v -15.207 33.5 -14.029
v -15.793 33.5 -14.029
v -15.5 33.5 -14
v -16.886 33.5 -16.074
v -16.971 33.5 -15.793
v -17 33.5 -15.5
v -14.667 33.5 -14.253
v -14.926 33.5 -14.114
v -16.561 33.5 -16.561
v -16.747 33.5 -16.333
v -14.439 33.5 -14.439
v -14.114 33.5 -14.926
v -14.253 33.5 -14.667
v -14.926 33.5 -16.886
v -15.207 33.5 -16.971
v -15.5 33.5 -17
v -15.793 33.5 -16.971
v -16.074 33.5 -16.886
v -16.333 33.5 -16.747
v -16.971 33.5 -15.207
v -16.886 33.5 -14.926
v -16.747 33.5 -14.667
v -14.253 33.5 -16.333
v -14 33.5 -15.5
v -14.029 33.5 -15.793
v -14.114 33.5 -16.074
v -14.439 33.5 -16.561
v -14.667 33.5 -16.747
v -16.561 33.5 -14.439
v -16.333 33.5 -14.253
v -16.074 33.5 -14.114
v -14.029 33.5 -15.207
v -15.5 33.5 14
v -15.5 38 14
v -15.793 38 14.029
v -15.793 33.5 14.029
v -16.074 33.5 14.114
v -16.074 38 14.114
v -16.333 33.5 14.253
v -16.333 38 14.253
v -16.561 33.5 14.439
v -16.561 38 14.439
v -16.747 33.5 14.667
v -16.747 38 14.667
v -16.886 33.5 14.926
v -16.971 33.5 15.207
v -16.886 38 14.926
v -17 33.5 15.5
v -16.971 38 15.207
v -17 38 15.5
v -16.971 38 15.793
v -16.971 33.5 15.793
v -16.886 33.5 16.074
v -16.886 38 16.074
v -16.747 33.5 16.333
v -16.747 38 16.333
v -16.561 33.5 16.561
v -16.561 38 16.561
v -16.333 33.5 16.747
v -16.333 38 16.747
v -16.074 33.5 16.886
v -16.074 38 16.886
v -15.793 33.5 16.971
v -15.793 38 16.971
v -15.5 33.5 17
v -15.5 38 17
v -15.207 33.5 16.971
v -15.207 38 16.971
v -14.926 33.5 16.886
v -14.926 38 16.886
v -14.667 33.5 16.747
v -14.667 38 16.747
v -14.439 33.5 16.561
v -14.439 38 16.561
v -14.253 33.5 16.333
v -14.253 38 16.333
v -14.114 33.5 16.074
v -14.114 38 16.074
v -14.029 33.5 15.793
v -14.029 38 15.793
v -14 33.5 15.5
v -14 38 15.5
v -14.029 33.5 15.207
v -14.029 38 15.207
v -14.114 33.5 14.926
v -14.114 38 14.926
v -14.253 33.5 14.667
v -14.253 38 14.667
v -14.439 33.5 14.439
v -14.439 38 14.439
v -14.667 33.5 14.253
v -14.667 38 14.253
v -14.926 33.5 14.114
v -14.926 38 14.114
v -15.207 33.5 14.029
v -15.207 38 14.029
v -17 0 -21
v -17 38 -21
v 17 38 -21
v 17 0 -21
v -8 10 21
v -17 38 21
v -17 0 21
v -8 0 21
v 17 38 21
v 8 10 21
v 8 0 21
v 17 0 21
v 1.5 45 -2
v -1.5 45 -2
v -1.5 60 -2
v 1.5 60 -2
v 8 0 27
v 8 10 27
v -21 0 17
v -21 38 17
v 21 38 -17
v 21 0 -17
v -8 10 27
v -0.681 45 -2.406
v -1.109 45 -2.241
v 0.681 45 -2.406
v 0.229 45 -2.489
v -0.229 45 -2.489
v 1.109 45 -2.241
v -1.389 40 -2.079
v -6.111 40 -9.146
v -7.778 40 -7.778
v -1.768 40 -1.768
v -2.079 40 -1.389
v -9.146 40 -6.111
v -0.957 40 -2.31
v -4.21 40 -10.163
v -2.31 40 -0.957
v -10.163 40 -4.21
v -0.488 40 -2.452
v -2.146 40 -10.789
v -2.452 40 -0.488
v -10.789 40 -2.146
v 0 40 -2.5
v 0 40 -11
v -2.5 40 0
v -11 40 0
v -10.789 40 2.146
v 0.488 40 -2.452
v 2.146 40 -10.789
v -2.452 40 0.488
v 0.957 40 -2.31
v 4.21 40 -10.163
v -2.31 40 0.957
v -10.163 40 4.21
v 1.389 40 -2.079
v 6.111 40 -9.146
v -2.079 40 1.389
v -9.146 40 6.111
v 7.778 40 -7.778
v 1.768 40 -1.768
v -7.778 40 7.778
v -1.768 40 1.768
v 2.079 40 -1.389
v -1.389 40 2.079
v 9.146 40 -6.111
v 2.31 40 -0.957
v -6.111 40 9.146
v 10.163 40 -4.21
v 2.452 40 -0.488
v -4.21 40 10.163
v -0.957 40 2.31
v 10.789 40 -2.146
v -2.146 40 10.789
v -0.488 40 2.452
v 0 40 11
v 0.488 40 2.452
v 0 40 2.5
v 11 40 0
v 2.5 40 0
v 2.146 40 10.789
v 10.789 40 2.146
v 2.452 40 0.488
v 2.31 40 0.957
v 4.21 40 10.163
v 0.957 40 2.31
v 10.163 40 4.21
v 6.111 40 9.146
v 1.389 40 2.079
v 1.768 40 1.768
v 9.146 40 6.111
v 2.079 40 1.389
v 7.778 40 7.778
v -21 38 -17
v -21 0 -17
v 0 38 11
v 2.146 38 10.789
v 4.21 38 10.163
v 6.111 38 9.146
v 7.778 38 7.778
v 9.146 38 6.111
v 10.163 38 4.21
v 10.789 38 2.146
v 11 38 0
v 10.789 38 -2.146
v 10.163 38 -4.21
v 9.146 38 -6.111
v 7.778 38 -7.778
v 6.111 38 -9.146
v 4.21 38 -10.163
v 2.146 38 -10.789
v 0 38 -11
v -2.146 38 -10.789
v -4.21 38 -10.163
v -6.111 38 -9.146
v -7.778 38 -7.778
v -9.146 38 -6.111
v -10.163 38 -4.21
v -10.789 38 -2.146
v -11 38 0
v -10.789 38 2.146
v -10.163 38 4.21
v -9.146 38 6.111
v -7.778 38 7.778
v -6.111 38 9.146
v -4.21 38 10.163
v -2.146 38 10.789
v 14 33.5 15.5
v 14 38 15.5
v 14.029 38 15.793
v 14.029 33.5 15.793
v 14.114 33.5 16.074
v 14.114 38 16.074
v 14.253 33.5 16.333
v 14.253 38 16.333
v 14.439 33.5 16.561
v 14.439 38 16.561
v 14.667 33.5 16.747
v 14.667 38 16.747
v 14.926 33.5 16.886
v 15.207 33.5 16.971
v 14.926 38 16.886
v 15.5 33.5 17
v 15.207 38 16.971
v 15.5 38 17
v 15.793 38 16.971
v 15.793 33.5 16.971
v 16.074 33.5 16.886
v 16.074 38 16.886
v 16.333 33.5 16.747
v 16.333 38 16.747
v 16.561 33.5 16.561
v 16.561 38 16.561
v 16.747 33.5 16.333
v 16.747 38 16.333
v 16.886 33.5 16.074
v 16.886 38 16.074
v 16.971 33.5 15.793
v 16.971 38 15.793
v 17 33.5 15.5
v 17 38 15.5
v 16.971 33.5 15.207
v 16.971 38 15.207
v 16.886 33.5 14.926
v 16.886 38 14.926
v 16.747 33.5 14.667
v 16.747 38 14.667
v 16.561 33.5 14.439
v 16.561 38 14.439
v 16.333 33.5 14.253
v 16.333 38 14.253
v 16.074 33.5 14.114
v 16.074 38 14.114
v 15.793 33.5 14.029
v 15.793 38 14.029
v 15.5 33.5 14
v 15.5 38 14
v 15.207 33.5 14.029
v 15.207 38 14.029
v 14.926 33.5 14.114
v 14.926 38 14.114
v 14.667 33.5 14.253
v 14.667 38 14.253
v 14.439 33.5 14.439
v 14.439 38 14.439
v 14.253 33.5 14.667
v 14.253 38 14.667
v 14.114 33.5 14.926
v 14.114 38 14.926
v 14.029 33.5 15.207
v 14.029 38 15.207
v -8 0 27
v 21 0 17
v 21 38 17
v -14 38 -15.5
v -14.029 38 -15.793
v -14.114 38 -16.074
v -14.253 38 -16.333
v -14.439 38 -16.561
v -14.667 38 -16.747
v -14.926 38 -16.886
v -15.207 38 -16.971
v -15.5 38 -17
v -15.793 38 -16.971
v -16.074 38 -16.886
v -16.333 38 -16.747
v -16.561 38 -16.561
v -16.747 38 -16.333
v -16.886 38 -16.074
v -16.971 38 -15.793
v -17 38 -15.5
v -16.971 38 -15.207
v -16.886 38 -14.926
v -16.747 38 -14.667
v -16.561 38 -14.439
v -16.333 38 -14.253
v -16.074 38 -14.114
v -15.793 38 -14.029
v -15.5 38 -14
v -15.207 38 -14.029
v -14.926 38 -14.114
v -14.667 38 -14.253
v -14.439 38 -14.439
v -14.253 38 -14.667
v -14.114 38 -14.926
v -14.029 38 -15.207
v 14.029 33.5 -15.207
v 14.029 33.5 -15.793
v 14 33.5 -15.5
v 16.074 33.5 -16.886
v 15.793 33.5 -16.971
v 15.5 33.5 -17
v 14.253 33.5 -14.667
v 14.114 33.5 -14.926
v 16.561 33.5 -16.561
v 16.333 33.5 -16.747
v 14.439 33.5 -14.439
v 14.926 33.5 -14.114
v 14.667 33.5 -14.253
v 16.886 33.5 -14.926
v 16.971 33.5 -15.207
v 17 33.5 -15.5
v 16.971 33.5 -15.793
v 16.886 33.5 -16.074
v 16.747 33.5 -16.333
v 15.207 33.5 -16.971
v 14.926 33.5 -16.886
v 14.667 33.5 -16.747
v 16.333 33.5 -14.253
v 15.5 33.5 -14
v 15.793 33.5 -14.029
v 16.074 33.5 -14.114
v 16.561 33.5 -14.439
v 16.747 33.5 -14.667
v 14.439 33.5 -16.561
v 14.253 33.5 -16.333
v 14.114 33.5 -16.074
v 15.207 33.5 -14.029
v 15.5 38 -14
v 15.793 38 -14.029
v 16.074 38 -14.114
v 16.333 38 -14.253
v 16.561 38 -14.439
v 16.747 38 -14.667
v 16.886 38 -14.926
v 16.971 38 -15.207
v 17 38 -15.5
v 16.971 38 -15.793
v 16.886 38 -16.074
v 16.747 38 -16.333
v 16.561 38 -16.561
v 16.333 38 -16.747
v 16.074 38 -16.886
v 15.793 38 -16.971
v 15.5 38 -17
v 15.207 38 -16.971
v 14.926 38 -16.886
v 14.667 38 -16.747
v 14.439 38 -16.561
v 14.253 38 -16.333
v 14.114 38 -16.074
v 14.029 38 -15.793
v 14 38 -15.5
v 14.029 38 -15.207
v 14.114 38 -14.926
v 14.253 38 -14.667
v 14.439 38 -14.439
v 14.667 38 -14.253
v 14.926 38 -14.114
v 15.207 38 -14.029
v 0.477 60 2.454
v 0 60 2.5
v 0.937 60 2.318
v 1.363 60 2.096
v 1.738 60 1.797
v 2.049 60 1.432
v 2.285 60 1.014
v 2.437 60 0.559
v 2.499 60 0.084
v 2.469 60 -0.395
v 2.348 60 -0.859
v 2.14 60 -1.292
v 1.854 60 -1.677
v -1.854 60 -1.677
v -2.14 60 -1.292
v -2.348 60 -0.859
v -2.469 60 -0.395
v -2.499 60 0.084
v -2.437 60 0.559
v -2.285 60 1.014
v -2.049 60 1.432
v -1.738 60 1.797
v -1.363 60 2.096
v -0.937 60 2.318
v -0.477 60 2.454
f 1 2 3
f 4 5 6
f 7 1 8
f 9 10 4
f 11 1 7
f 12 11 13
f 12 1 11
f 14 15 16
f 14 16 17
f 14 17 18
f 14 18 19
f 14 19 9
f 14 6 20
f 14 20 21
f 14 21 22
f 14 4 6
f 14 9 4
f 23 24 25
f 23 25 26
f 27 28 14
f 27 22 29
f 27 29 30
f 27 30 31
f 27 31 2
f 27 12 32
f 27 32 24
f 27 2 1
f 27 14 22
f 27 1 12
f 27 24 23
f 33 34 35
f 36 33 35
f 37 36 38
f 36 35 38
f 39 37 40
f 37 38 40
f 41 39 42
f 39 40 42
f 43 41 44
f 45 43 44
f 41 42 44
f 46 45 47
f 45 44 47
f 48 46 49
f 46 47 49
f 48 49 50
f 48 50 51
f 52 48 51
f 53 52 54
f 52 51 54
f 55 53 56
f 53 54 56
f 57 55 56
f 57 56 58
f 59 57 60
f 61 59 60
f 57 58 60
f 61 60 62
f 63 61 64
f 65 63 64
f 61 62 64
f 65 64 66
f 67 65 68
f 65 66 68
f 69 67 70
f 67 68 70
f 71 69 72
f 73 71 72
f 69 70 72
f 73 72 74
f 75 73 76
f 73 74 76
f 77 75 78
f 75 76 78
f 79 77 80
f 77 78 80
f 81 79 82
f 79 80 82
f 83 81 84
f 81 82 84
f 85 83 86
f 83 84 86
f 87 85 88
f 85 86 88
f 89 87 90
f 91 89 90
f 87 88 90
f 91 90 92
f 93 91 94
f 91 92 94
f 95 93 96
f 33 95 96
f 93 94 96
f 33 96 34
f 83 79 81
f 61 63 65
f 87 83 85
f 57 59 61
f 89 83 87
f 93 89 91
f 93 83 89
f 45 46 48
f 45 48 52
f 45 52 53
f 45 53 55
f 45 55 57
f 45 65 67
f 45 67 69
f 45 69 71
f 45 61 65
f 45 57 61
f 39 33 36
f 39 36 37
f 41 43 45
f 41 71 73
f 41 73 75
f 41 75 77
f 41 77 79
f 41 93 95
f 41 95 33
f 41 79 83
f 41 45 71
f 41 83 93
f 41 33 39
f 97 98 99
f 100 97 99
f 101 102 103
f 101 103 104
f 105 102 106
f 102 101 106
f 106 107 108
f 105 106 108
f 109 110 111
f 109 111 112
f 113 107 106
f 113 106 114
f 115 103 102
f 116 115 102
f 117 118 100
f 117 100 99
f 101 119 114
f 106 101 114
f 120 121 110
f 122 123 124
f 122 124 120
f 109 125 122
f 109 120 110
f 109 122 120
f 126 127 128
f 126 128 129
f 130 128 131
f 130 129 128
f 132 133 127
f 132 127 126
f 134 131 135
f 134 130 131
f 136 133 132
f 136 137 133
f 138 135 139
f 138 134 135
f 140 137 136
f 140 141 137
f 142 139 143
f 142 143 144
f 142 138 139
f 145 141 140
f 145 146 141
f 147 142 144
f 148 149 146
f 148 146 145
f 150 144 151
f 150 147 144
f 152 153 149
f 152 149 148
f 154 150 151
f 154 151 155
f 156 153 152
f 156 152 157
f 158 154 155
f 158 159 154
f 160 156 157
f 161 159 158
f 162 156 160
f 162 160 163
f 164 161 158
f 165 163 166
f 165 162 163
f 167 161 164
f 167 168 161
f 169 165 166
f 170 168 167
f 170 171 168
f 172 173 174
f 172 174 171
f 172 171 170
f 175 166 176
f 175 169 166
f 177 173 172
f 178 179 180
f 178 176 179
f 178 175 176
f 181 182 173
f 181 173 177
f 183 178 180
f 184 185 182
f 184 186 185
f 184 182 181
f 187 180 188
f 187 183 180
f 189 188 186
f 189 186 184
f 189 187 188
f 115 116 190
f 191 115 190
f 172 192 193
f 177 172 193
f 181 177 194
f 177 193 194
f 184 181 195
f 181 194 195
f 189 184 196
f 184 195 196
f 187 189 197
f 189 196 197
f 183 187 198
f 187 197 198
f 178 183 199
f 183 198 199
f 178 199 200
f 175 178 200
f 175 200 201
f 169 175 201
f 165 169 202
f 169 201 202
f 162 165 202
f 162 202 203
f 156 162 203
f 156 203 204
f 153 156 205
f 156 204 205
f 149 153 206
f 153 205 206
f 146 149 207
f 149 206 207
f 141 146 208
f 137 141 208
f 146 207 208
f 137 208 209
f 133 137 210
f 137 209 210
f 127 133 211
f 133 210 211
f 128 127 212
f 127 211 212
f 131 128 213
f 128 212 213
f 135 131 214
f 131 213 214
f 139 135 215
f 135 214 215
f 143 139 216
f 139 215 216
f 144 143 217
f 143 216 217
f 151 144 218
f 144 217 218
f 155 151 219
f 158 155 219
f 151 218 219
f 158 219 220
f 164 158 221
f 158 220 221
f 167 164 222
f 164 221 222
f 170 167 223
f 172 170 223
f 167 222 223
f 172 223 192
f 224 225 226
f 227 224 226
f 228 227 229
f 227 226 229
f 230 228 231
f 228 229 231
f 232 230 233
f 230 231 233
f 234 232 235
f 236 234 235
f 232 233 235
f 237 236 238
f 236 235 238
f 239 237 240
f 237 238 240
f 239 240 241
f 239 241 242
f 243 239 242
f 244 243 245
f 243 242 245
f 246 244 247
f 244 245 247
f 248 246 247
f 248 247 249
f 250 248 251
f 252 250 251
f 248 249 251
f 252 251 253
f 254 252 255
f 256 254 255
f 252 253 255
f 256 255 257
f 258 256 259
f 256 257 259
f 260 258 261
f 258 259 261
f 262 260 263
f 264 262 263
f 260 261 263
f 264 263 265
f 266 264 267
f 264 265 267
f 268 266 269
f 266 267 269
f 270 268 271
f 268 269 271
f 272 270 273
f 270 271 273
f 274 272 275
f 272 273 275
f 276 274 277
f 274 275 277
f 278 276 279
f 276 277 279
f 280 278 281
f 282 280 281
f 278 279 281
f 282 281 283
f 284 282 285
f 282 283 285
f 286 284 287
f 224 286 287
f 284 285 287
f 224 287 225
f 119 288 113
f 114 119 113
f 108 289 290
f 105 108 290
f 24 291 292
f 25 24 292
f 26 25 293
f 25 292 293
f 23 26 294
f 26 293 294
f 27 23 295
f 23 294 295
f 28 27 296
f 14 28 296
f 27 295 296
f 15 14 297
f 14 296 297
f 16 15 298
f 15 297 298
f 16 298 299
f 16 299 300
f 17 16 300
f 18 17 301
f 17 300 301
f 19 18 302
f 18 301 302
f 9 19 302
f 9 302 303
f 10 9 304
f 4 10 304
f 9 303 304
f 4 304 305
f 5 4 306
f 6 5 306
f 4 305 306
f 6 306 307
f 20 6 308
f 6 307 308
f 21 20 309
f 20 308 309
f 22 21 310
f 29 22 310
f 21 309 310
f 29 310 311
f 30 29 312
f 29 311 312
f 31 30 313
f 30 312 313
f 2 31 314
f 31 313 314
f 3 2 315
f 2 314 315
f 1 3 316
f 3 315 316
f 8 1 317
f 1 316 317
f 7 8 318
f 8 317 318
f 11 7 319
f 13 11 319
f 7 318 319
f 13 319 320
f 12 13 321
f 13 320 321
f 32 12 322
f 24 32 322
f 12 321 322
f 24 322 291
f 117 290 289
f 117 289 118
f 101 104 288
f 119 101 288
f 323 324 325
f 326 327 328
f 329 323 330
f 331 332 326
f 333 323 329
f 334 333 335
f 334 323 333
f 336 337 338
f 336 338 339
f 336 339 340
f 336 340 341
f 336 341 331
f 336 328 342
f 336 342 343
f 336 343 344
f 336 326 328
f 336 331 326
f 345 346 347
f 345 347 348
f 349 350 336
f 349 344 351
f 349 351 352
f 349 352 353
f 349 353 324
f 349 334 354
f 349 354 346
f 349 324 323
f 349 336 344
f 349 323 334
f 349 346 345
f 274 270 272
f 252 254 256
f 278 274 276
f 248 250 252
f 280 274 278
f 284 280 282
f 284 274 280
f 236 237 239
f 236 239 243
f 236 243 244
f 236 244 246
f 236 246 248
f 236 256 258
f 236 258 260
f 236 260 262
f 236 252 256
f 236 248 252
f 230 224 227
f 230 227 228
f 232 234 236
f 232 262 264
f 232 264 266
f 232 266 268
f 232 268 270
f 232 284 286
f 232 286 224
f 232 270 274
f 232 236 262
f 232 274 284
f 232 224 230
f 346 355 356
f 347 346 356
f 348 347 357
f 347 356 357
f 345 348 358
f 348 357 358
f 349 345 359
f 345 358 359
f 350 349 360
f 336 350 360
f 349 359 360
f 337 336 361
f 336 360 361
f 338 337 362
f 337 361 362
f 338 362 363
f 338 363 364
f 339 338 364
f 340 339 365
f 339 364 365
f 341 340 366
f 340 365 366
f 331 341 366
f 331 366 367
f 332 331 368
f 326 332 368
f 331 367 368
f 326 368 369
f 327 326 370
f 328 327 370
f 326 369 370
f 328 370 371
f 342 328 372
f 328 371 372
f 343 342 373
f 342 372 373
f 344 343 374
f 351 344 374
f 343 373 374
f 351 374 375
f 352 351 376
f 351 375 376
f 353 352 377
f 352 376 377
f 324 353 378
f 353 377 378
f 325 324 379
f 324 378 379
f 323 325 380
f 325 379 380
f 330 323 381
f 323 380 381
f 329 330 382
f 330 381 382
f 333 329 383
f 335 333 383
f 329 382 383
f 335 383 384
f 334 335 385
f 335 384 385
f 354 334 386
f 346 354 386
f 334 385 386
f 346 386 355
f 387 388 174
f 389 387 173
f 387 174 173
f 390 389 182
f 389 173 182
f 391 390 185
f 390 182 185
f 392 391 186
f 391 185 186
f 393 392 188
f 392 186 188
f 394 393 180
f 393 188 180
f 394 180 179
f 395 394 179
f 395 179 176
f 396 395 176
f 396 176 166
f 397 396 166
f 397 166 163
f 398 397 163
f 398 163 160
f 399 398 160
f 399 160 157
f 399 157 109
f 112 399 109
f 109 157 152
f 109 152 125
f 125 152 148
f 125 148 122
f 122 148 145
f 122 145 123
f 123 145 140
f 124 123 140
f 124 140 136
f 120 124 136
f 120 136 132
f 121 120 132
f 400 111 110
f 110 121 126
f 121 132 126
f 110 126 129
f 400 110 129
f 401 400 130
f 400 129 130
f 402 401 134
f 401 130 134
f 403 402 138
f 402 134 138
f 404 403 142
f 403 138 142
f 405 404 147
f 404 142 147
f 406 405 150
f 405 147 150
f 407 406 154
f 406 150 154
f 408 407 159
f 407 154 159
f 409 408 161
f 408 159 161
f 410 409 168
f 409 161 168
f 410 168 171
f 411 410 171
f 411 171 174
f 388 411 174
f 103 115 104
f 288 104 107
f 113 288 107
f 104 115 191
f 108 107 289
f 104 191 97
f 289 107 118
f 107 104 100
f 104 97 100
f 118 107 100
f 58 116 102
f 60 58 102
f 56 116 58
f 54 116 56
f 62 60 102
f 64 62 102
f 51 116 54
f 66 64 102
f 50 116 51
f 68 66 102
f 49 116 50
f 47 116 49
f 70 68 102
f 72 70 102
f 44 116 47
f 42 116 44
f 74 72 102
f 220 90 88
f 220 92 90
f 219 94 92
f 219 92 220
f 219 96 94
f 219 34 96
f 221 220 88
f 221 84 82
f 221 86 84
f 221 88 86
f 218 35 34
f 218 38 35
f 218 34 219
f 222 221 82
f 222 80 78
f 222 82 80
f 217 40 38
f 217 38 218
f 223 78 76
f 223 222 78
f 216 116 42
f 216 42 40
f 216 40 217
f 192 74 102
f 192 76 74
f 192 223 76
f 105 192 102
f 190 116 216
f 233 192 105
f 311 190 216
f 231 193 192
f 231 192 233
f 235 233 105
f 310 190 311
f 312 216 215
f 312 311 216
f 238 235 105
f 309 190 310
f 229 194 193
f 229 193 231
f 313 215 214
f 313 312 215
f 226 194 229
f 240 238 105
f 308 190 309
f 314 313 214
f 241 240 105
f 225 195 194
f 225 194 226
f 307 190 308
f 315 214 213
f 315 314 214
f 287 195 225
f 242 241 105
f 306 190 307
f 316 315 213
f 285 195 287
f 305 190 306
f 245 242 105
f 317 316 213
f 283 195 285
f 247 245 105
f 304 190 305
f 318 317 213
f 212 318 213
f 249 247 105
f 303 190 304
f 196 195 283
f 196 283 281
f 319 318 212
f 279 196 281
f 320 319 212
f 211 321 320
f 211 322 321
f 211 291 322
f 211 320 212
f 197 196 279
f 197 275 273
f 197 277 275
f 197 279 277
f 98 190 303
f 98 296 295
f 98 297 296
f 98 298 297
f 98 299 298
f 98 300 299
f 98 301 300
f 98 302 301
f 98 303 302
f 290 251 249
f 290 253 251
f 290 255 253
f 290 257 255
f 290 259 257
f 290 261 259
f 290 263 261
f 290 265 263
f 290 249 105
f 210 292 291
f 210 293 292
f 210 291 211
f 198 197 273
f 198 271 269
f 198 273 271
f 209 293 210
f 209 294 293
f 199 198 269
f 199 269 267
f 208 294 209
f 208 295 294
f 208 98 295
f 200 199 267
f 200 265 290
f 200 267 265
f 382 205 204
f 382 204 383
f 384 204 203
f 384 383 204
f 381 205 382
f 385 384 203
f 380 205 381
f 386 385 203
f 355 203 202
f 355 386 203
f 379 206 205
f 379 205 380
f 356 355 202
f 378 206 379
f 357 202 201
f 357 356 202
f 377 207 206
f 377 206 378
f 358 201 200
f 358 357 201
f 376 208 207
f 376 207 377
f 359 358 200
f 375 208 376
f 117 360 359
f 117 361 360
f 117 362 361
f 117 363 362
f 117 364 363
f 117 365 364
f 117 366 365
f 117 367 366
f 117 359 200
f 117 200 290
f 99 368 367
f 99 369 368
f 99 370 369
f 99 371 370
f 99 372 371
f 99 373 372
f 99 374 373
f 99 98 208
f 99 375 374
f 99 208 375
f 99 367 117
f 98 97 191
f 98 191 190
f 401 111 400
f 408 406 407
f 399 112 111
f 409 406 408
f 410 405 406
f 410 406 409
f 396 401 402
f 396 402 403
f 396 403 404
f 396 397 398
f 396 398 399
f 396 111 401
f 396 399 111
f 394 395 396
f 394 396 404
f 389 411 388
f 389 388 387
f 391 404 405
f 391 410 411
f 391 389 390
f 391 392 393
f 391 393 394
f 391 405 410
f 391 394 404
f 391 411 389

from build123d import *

# Parameters (mm, degrees)
SKETCH_1_W               = 42
SKETCH_1_H               = 42
EXTRUDE_1_DEPTH          = 38
SKETCH_2_R               = 11
EXTRUDE_2_DEPTH          = 2
SKETCH_3_R               = 2.5
EXTRUDE_3_DEPTH          = 20
CUT_EXTRUDE_START        = -15
CUT_EXTRUDE_1_DEPTH      = 15
SKETCH_5_R               = 1.5
CUT_EXTRUDE_2_DEPTH      = 4.5
PATTERN_CIRCULAR_1_COUNT = 4
SKETCH_6_W               = 16
SKETCH_6_H               = 6
EXTRUDE_4_DEPTH          = 10
CHAMFER_1_SIZE           = 4


with BuildPart() as part:
    # 草图1 → 凸台-拉伸1 (new body)
    with BuildSketch(Plane(origin=(0, 0, 0), x_dir=(1, 0, 0), z_dir=(0, 1, 0))):
        Rectangle(SKETCH_1_W, SKETCH_1_H)
    extrude(amount=EXTRUDE_1_DEPTH)

    # 草图2 → 凸台-拉伸2 (add)
    with BuildSketch(Plane(origin=(0, 38, 0), x_dir=(1, 0, 0), z_dir=(0, 1, 0))):
        with Locations(Location((0, 0, 0), (0, 0, 270))):
            Circle(SKETCH_2_R)
    extrude(amount=EXTRUDE_2_DEPTH)

    # 草图3 → 凸台-拉伸3 (add)
    with BuildSketch(Plane(origin=(0, 40, 0), x_dir=(1, 0, 0), z_dir=(0, 1, 0))):
        with Locations(Location((0, 0, 0), (0, 0, 270))):
            Circle(SKETCH_3_R)
    extrude(amount=EXTRUDE_3_DEPTH)

    # 草图4 → 切除-拉伸1 (cut)
    with BuildSketch(Plane(origin=(0, 60, 0), x_dir=(1, 0, 0), z_dir=(0, 1, 0)).offset(CUT_EXTRUDE_START)):
        with BuildLine():
            Line((-1.5, 2), (1.5, 2))
            ThreePointArc((1.5, 2), (0, 2.5), (-1.5, 2))
        make_face()
    extrude(amount=CUT_EXTRUDE_1_DEPTH, mode=Mode.SUBTRACT)

    # 草图5 → 切除-拉伸2 (cut)
    with BuildSketch(Plane(origin=(0, 38, 0), x_dir=(1, 0, 0), z_dir=(0, 1, 0))):
        with Locations(Location((15.5, 15.5, 0), (0, 0, 270))):
            Circle(SKETCH_5_R)
    cut_extrude_2 = extrude(amount=-CUT_EXTRUDE_2_DEPTH, mode=Mode.SUBTRACT)

    # 阵列(圆周)1: 切除-拉伸2 ×4 about axis
    pattern_circular_1_axis = Axis((0, 0, 0), (0, 1, 0))
    for i in range(1, PATTERN_CIRCULAR_1_COUNT):
        add(cut_extrude_2.rotate(pattern_circular_1_axis, i * 360 / PATTERN_CIRCULAR_1_COUNT), mode=Mode.SUBTRACT)

    # 草图6 → 凸台-拉伸4 (add)
    with BuildSketch(Plane.XZ):
        with Locations((0, 24)):
            Rectangle(SKETCH_6_W, SKETCH_6_H)
    extrude(amount=-EXTRUDE_4_DEPTH)

    # 倒角1
    chamfer_1_edges = [part.edges().sort_by_distance(p)[0] for p in [
        (21, 19, 21),
        (-21, 19, 21),
        (-21, 19, -21),
        (21, 19, -21),
    ]]
    chamfer(chamfer_1_edges, length=CHAMFER_1_SIZE)


solid = part.part
